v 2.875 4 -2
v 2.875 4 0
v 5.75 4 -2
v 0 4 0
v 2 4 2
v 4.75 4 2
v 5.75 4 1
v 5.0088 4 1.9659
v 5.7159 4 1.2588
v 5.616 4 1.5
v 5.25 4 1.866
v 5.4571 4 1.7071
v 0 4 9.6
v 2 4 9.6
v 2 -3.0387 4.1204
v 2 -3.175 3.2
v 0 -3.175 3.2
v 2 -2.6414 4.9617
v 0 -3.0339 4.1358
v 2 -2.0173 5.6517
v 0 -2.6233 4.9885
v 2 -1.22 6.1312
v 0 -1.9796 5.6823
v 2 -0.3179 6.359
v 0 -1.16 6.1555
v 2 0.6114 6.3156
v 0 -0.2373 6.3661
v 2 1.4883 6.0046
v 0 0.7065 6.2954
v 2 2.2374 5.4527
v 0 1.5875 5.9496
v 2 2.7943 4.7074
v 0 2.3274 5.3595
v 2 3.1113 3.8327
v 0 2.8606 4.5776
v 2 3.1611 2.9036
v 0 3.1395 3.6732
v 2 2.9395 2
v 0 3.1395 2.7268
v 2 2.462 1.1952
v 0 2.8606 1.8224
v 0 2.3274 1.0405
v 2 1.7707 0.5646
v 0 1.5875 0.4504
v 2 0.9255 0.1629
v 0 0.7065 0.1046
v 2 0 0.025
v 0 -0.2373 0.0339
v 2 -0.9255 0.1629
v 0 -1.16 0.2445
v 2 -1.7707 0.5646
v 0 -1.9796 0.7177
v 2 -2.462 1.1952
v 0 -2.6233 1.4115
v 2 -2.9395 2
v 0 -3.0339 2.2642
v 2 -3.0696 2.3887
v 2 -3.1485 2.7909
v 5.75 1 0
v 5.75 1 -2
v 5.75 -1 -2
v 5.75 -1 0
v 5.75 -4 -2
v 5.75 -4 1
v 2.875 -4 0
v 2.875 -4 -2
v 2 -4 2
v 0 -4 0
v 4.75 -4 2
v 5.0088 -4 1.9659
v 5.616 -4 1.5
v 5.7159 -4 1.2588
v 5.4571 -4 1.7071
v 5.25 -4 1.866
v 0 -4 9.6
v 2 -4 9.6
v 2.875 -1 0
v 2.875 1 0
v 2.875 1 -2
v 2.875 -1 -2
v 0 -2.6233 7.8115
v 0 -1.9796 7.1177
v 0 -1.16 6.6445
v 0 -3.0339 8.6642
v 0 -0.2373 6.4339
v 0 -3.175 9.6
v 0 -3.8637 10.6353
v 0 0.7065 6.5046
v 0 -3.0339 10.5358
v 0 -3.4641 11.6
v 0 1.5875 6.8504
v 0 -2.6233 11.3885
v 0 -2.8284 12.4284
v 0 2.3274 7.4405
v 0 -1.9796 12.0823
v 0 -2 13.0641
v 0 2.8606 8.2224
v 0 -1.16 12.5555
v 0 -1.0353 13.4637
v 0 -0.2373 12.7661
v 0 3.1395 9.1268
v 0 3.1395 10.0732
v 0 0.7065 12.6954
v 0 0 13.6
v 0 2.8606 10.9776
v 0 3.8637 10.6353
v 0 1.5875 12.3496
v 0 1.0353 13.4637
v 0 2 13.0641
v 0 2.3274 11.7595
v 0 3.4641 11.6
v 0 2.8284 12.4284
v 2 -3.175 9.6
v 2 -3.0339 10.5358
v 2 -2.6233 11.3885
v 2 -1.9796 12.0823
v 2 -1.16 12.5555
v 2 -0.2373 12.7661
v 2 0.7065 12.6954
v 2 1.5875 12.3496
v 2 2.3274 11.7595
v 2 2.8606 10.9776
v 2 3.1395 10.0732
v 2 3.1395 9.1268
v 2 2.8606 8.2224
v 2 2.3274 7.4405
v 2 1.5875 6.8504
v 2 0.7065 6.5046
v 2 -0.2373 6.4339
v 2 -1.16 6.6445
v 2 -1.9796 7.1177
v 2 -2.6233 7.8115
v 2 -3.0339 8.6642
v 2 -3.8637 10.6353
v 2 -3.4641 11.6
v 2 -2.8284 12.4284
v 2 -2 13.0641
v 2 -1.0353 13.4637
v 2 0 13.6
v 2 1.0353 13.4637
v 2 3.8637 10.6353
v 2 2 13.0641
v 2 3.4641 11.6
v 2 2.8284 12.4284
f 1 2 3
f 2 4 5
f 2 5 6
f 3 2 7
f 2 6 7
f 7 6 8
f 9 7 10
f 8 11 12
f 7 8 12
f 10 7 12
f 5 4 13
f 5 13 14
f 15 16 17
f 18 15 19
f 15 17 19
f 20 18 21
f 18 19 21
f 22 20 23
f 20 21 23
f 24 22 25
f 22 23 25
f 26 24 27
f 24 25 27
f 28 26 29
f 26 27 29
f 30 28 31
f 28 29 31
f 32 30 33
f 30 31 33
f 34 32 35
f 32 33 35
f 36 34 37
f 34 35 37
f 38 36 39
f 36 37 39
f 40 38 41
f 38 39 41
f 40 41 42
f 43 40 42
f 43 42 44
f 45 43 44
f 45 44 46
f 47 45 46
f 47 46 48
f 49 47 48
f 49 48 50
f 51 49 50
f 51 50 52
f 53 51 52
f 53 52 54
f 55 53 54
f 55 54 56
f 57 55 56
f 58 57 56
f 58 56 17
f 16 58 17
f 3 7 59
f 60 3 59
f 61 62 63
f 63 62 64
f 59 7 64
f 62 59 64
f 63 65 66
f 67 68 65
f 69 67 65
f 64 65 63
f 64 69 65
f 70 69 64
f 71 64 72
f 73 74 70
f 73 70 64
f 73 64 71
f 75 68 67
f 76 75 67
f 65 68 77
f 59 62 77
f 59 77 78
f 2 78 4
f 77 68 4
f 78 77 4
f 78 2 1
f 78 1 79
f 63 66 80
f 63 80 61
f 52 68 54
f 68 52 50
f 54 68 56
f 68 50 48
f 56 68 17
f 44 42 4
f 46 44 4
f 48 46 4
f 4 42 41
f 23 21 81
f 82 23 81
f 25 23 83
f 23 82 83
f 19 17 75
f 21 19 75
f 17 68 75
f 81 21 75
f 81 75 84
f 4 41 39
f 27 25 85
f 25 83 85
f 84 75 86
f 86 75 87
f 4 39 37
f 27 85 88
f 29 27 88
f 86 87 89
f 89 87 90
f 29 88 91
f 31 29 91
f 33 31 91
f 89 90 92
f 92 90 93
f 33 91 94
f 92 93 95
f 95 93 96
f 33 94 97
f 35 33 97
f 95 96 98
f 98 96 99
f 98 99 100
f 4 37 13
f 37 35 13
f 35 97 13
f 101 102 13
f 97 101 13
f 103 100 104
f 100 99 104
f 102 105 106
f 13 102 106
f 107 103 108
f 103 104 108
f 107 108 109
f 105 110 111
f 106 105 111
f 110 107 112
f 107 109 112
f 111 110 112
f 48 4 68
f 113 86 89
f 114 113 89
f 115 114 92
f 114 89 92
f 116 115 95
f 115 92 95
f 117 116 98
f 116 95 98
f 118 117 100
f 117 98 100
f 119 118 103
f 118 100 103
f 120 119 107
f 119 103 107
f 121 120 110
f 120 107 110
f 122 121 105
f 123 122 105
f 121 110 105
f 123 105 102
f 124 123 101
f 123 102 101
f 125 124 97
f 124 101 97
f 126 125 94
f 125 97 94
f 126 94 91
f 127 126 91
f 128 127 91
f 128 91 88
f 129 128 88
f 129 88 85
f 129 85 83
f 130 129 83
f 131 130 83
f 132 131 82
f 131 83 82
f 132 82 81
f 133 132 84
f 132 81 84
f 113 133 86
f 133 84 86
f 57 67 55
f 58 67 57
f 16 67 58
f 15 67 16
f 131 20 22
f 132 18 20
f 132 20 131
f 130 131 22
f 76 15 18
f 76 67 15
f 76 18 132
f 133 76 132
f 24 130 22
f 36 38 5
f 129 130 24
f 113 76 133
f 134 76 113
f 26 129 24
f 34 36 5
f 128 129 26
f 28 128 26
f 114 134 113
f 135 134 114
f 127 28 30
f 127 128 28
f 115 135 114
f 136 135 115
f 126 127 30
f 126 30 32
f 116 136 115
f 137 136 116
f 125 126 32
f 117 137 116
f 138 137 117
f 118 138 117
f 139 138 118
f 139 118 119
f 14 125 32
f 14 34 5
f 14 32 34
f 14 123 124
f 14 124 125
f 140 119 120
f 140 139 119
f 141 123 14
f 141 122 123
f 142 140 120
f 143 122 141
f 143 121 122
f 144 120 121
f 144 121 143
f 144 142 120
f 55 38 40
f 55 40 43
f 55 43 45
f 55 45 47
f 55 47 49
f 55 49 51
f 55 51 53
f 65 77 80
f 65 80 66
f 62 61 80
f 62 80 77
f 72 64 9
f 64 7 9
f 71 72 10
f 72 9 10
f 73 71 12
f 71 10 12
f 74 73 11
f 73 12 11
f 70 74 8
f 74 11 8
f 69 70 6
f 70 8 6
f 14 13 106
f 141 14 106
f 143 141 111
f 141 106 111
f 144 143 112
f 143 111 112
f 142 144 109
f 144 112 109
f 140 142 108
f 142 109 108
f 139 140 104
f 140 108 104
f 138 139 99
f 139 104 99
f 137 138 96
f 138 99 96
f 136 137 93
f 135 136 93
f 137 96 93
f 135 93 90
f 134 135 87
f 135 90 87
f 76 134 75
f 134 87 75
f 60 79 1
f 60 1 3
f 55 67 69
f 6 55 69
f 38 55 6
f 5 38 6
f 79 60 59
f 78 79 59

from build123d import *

# Parameters (mm, degrees)
F1_DEPTH  = 2
F2_W      = 8
F2_H      = 2
F3_DEPTH  = 3.75
F4_W      = 2.875
F4_H      = 8
F5_DEPTH  = 2
F6_W      = 2
F6_H      = 2
F7_DEPTH  = 25
F8_R      = 3.175
F9_DEPTH  = 2
F10_R     = 3.175
F11_DEPTH = 2
F12_R     = 1


with BuildPart() as f1:
    # F0 (on Right) → F1 (new body)
    with BuildSketch(Plane.YZ):
        with BuildLine():
            Line((-4, 9.6), (4, 9.6))
            ThreePointArc((4, 9.6), (0, 13.6), (-4, 9.6))
        make_face()
        with BuildLine():
            ThreePointArc((-4, 9.6), (0, 5.6), (4, 9.6))
            Line((4, 9.6), (-4, 9.6))
        make_face()
        with BuildLine():
            Line((4, 0), (4, 9.6))
            ThreePointArc((4, 9.6), (0, 5.6), (-4, 9.6))
            Line((-4, 9.6), (-4, 0))
            Line((-4, 0), (4, 0))
        make_face()
    extrude(amount=F1_DEPTH)

    # F2 (on face) → F3 (join)
    with BuildSketch(Plane.YZ.offset(2)):
        with Locations((0, 1)):
            Rectangle(F2_W, F2_H)
    extrude(amount=F3_DEPTH)

    # F4 (on face) → F5 (join)
    with BuildSketch(Plane(origin=(0, 0, 0), x_dir=(1, 0, 0), z_dir=(0, 0, -1))):
        with Locations((4.3125, 0)):
            Rectangle(F4_W, F4_H)
    extrude(amount=F5_DEPTH)

    # F6 (on face) → F7 (cut)
    with BuildSketch(Plane.YZ.offset(5.75)):
        with Locations((0, -1)):
            Rectangle(F6_W, F6_H)
    extrude(amount=-F7_DEPTH, mode=Mode.SUBTRACT)

    # F8 (on face) → F9 (cut)
    with BuildSketch(Plane(origin=(0, 0, 0), x_dir=(0, -1, 0), z_dir=(-1, 0, 0))):
        with Locations((0, 9.6)):
            Circle(F8_R)
    extrude(amount=-F9_DEPTH, mode=Mode.SUBTRACT)

    # F10 (on face) → F11 (cut)
    with BuildSketch(Plane(origin=(0, 0, 0), x_dir=(0, -1, 0), z_dir=(-1, 0, 0))):
        with Locations((0, 3.2)):
            Circle(F10_R)
    extrude(amount=-F11_DEPTH, mode=Mode.SUBTRACT)

    # F12
    f12_edges = [f1.edges().sort_by_distance(p)[0] for p in [
        (5.75, 0, 2),
    ]]
    fillet(f12_edges, radius=F12_R)


solid = f1.part
